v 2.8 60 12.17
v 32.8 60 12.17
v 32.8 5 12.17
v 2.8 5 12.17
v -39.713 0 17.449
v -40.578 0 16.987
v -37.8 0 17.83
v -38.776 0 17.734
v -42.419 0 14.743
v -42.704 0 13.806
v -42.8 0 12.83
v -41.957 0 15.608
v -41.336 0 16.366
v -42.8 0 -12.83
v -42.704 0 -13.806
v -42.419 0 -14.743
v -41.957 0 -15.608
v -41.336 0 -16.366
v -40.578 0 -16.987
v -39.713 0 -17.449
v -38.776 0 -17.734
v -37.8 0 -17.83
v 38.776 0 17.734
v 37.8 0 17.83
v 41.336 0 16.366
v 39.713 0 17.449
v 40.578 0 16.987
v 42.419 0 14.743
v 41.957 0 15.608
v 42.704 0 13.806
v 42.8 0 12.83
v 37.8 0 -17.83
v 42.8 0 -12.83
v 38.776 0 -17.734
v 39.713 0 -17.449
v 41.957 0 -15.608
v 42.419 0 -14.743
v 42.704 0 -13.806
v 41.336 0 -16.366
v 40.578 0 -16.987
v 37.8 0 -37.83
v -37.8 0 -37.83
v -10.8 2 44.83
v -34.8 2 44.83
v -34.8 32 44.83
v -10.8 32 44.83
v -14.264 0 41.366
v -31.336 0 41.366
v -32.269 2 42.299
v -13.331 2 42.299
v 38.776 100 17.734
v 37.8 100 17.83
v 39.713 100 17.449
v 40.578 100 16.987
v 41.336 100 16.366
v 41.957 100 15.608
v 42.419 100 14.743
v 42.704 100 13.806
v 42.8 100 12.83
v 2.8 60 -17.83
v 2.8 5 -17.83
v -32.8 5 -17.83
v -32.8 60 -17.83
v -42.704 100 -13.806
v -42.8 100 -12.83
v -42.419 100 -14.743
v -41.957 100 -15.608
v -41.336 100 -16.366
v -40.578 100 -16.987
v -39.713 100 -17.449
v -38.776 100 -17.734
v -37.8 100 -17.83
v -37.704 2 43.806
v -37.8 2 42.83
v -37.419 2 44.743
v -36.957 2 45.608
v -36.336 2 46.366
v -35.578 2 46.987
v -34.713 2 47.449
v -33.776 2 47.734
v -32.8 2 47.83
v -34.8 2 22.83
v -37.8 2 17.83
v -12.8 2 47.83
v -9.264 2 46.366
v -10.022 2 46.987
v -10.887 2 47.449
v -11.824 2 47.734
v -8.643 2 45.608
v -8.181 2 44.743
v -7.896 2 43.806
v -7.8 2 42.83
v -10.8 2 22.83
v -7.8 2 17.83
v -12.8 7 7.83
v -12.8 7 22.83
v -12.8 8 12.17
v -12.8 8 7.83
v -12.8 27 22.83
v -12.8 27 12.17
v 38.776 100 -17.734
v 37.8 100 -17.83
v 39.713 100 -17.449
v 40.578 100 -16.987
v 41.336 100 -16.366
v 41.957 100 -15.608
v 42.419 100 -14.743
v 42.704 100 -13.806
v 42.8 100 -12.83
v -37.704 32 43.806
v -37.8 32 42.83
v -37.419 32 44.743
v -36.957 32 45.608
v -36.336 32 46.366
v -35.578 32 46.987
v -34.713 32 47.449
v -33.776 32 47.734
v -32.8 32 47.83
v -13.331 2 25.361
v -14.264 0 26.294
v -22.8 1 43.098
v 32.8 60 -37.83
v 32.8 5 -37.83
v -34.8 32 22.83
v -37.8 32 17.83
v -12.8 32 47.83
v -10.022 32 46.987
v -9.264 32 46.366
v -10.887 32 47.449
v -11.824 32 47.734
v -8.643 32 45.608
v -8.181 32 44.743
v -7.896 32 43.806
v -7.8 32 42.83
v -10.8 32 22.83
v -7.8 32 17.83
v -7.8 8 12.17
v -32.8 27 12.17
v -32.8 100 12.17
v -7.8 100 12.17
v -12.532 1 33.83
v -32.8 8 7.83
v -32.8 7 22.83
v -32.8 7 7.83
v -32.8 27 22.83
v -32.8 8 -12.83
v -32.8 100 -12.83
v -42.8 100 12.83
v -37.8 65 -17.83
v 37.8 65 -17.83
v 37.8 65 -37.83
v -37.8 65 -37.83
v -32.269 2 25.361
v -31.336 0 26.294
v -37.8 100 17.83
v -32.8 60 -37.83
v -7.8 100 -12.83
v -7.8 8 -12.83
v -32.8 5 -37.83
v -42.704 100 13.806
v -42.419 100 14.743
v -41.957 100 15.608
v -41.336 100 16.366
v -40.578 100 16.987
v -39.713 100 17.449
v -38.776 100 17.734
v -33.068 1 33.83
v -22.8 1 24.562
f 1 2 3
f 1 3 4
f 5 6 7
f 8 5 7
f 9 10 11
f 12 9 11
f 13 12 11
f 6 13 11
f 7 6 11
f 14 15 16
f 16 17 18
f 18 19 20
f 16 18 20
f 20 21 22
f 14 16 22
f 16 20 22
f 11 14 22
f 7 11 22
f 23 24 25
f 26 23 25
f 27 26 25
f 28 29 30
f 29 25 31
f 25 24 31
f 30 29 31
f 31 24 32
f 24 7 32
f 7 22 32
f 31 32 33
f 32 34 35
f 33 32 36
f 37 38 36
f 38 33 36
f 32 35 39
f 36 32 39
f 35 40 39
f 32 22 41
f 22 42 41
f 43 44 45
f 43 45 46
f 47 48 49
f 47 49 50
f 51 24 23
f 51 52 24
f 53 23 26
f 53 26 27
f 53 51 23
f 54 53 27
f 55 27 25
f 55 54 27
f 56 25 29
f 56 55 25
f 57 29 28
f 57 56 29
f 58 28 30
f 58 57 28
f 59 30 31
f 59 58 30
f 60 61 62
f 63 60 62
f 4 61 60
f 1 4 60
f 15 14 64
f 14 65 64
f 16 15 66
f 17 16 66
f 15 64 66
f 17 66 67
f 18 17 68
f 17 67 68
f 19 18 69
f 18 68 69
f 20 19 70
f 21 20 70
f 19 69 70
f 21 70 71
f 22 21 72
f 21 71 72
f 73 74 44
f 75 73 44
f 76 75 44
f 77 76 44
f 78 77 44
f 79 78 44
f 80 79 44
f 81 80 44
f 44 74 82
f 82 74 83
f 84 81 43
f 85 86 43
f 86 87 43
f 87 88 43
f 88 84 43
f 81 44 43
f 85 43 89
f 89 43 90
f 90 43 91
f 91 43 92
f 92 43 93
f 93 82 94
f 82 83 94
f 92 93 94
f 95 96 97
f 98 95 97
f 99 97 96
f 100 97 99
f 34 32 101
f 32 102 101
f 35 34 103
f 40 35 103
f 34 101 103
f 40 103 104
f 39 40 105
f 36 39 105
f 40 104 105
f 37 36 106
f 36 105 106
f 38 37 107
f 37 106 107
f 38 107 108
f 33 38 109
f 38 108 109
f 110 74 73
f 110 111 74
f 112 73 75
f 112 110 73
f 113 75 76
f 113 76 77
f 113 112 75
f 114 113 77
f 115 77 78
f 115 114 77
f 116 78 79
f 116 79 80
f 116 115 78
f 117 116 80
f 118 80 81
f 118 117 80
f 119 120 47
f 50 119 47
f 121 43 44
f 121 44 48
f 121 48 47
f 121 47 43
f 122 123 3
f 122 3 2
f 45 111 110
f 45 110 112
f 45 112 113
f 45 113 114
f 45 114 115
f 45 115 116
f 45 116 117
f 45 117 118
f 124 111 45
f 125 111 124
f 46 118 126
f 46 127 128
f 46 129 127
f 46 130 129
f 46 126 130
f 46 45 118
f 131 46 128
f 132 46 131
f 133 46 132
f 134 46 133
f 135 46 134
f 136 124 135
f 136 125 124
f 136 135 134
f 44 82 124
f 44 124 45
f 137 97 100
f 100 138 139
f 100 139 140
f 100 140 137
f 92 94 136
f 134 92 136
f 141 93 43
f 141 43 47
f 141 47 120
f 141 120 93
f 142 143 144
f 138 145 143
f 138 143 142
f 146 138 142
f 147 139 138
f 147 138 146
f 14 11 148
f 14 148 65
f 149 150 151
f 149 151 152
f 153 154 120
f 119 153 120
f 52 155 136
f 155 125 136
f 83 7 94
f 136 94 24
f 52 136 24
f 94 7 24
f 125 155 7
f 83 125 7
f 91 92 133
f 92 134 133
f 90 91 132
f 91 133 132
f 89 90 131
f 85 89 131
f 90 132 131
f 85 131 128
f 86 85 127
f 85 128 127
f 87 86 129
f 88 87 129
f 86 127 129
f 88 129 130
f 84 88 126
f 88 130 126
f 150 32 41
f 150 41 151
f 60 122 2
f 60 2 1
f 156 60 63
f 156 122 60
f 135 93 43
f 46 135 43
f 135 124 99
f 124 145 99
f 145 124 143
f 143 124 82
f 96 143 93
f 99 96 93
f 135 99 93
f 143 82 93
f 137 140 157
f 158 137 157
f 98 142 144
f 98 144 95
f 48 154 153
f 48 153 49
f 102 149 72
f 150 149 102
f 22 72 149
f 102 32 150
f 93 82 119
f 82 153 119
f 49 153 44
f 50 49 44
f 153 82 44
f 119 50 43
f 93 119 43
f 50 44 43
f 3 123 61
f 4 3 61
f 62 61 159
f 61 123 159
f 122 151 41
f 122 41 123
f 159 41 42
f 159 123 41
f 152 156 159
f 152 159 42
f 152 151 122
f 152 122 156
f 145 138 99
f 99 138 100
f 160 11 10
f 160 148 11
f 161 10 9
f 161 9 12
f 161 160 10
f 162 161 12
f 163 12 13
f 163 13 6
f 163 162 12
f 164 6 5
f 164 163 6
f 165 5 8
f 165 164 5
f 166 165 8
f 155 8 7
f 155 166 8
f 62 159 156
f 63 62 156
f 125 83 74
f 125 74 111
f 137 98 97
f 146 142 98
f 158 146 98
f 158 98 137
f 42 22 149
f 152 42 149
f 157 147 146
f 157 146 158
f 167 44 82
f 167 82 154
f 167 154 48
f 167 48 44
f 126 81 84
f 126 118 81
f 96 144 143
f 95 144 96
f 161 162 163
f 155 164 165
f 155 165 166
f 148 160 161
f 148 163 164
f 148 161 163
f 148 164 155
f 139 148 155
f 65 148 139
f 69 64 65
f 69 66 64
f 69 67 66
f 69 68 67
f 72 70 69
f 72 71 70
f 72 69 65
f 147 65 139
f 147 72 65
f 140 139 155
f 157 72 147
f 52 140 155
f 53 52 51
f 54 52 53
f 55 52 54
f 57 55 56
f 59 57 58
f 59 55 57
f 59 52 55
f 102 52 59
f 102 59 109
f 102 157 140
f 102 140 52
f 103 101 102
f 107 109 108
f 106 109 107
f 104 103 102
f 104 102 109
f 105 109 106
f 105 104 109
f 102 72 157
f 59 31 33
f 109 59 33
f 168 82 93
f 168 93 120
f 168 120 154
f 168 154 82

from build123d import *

# Parameters (mm, degrees)
CROQUIS1_W                 = 85.6
CROQUIS1_H                 = 35.66
SALIENTE_EXTRUIR1_DEPTH    = 100
CROQUIS2_W                 = 25
CROQUIS2_H                 = 25
CORTAR_EXTRUIR1_DEPTH      = 92
CROQUIS3_W                 = 30
CROQUIS3_H                 = 30
SALIENTE_EXTRUIR2_DEPTH    = 30
CROQUIS4_W                 = 24
CROQUIS4_H                 = 22
CORTAR_EXTRUIR2_DEPTH      = 30
REDONDEO1_R                = 5
CROQUIS8_W                 = 75.6
CROQUIS8_H                 = 65
SALIENTE_EXTRUIR3_DEPTH    = 20
CORTAR_EXTRUIR3_DEPTH      = 10
CORTAR_EXTRUIR3_DEPTH_BACK = 10
CROQUIS6_W                 = 20
CROQUIS6_H                 = 20
CROQUIS9_W                 = 24
CROQUIS9_H                 = 22
SALIENTE_EXTRUIR4_DEPTH    = 2
SALIENTE_EXTRUIR4_TAPER    = 60
CROQUIS10_W                = 17.07179677
CROQUIS10_H                = 15.07179677
CORTAR_EXTRUIR4_DEPTH      = 2
CORTAR_EXTRUIR4_DRAFT      = 25
CROQUIS12_W                = 65.6
CROQUIS12_H                = 55
CORTAR_EXTRUIR6_DEPTH      = 20
CROQUIS17_W                = 30
CROQUIS17_H                = 55
CORTAR_EXTRUIR11_DEPTH     = 30


with BuildPart() as part:
    # Croquis1 → Saliente-Extruir1 (new body)
    with BuildSketch(Plane(origin=(0, 0, 0), x_dir=(1, 0, 0), z_dir=(0, 1, 0))):
        Rectangle(CROQUIS1_W, CROQUIS1_H)
    extrude(amount=SALIENTE_EXTRUIR1_DEPTH)

    # Croquis2 → Cortar-Extruir1 (cut)
    with BuildSketch(Plane(origin=(0, 100, 0), x_dir=(1, 0, 0), z_dir=(0, 1, 0))):
        with Locations((-20.3, 0.33)):
            Rectangle(CROQUIS2_W, CROQUIS2_H)
    extrude(amount=-CORTAR_EXTRUIR1_DEPTH, mode=Mode.SUBTRACT)

    # Croquis3 → Saliente-Extruir2 (add)
    with BuildSketch(Plane.XY.offset(17.83)):
        with Locations((-22.8, 17)):
            Rectangle(CROQUIS3_W, CROQUIS3_H)
    extrude(amount=SALIENTE_EXTRUIR2_DEPTH)

    # Croquis4 → Cortar-Extruir2 (cut)
    with BuildSketch(Plane.XZ.offset(-2)):
        with Locations((-22.8, 33.83)):
            Rectangle(CROQUIS4_W, CROQUIS4_H)
    extrude(amount=-CORTAR_EXTRUIR2_DEPTH, mode=Mode.SUBTRACT)

    # Redondeo1
    redondeo1_edges = [part.edges().sort_by_distance(p)[0] for p in [
        (-7.8, 17, 47.83),
        (-37.8, 17, 47.83),
        (42.8, 50, 17.83),
        (-42.8, 50, 17.83),
        (-42.8, 50, -17.83),
        (42.8, 50, -17.83),
    ]]
    fillet(redondeo1_edges, radius=REDONDEO1_R - 0.0001)  # a hair under: the kernel refuses the full size

    # Croquis8 → Saliente-Extruir3 (add)
    with BuildSketch(Plane(origin=(0, 0, -17.83), x_dir=(-1, 0, 0), z_dir=(0, 0, -1))):
        with Locations((0, 32.5)):
            Rectangle(CROQUIS8_W, CROQUIS8_H)
    extrude(amount=SALIENTE_EXTRUIR3_DEPTH)

    # Croquis6 → Cortar-Extruir3 (cut, two sides: drawn at the far end of the back side and taken through both)
    with BuildSketch(Plane.XY.offset(17.83).offset(-CORTAR_EXTRUIR3_DEPTH_BACK)):
        with Locations((-22.8, 17)):
            Rectangle(CROQUIS6_W, CROQUIS6_H)
    extrude(amount=CORTAR_EXTRUIR3_DEPTH + CORTAR_EXTRUIR3_DEPTH_BACK, mode=Mode.SUBTRACT)

    # Croquis12 → Cortar-Extruir6 (cut)
    with BuildSketch(Plane(origin=(0, 0, -37.83), x_dir=(-1, 0, 0), z_dir=(0, 0, -1))):
        with Locations((0, 32.5)):
            Rectangle(CROQUIS12_W, CROQUIS12_H)
    extrude(amount=-CORTAR_EXTRUIR6_DEPTH, mode=Mode.SUBTRACT)

    # Croquis17 → Cortar-Extruir11 (cut)
    with BuildSketch(Plane(origin=(0, 0, -17.83), x_dir=(-1, 0, 0), z_dir=(0, 0, -1))):
        with Locations((-17.8, 32.5)):
            Rectangle(CROQUIS17_W, CROQUIS17_H)
    extrude(amount=-CORTAR_EXTRUIR11_DEPTH, mode=Mode.SUBTRACT)


with BuildPart() as body_2:
    # Croquis9 → Saliente-Extruir4 (new body)
    with BuildSketch(Plane.XZ.offset(-2)):
        with Locations((-22.8, 33.83)):
            Rectangle(CROQUIS9_W, CROQUIS9_H)
    extrude(amount=SALIENTE_EXTRUIR4_DEPTH, taper=SALIENTE_EXTRUIR4_TAPER)


with BuildPart() as cortar_extruir4_tool:
    # Croquis10 → Cortar-Extruir4 (with draft: the straight prism first)
    with BuildSketch(Plane.XZ):
        with Locations((-22.8, 33.83)):
            Rectangle(CROQUIS10_W, CROQUIS10_H)
    extrude(amount=-CORTAR_EXTRUIR4_DEPTH)
    # Cortar-Extruir4: the draft: its side faces are tilted about the plane it starts from
    cortar_extruir4_sides = [cortar_extruir4_tool.faces().sort_by_distance(p)[0] for p in [
        (-22.8, 1, 26.294101615),
        (-14.264101615, 1, 33.83),
        (-22.8, 1, 41.365898385),
        (-31.335898385, 1, 33.83),
    ]]
    draft(cortar_extruir4_sides, Plane.XZ, CORTAR_EXTRUIR4_DRAFT)


with BuildPart() as body_2_1:
    add(body_2.part)

    # Cortar-Extruir4: cut by cortar_extruir4_tool
    add(cortar_extruir4_tool.part, mode=Mode.SUBTRACT)


solid = Compound([part.part, body_2_1.part])
